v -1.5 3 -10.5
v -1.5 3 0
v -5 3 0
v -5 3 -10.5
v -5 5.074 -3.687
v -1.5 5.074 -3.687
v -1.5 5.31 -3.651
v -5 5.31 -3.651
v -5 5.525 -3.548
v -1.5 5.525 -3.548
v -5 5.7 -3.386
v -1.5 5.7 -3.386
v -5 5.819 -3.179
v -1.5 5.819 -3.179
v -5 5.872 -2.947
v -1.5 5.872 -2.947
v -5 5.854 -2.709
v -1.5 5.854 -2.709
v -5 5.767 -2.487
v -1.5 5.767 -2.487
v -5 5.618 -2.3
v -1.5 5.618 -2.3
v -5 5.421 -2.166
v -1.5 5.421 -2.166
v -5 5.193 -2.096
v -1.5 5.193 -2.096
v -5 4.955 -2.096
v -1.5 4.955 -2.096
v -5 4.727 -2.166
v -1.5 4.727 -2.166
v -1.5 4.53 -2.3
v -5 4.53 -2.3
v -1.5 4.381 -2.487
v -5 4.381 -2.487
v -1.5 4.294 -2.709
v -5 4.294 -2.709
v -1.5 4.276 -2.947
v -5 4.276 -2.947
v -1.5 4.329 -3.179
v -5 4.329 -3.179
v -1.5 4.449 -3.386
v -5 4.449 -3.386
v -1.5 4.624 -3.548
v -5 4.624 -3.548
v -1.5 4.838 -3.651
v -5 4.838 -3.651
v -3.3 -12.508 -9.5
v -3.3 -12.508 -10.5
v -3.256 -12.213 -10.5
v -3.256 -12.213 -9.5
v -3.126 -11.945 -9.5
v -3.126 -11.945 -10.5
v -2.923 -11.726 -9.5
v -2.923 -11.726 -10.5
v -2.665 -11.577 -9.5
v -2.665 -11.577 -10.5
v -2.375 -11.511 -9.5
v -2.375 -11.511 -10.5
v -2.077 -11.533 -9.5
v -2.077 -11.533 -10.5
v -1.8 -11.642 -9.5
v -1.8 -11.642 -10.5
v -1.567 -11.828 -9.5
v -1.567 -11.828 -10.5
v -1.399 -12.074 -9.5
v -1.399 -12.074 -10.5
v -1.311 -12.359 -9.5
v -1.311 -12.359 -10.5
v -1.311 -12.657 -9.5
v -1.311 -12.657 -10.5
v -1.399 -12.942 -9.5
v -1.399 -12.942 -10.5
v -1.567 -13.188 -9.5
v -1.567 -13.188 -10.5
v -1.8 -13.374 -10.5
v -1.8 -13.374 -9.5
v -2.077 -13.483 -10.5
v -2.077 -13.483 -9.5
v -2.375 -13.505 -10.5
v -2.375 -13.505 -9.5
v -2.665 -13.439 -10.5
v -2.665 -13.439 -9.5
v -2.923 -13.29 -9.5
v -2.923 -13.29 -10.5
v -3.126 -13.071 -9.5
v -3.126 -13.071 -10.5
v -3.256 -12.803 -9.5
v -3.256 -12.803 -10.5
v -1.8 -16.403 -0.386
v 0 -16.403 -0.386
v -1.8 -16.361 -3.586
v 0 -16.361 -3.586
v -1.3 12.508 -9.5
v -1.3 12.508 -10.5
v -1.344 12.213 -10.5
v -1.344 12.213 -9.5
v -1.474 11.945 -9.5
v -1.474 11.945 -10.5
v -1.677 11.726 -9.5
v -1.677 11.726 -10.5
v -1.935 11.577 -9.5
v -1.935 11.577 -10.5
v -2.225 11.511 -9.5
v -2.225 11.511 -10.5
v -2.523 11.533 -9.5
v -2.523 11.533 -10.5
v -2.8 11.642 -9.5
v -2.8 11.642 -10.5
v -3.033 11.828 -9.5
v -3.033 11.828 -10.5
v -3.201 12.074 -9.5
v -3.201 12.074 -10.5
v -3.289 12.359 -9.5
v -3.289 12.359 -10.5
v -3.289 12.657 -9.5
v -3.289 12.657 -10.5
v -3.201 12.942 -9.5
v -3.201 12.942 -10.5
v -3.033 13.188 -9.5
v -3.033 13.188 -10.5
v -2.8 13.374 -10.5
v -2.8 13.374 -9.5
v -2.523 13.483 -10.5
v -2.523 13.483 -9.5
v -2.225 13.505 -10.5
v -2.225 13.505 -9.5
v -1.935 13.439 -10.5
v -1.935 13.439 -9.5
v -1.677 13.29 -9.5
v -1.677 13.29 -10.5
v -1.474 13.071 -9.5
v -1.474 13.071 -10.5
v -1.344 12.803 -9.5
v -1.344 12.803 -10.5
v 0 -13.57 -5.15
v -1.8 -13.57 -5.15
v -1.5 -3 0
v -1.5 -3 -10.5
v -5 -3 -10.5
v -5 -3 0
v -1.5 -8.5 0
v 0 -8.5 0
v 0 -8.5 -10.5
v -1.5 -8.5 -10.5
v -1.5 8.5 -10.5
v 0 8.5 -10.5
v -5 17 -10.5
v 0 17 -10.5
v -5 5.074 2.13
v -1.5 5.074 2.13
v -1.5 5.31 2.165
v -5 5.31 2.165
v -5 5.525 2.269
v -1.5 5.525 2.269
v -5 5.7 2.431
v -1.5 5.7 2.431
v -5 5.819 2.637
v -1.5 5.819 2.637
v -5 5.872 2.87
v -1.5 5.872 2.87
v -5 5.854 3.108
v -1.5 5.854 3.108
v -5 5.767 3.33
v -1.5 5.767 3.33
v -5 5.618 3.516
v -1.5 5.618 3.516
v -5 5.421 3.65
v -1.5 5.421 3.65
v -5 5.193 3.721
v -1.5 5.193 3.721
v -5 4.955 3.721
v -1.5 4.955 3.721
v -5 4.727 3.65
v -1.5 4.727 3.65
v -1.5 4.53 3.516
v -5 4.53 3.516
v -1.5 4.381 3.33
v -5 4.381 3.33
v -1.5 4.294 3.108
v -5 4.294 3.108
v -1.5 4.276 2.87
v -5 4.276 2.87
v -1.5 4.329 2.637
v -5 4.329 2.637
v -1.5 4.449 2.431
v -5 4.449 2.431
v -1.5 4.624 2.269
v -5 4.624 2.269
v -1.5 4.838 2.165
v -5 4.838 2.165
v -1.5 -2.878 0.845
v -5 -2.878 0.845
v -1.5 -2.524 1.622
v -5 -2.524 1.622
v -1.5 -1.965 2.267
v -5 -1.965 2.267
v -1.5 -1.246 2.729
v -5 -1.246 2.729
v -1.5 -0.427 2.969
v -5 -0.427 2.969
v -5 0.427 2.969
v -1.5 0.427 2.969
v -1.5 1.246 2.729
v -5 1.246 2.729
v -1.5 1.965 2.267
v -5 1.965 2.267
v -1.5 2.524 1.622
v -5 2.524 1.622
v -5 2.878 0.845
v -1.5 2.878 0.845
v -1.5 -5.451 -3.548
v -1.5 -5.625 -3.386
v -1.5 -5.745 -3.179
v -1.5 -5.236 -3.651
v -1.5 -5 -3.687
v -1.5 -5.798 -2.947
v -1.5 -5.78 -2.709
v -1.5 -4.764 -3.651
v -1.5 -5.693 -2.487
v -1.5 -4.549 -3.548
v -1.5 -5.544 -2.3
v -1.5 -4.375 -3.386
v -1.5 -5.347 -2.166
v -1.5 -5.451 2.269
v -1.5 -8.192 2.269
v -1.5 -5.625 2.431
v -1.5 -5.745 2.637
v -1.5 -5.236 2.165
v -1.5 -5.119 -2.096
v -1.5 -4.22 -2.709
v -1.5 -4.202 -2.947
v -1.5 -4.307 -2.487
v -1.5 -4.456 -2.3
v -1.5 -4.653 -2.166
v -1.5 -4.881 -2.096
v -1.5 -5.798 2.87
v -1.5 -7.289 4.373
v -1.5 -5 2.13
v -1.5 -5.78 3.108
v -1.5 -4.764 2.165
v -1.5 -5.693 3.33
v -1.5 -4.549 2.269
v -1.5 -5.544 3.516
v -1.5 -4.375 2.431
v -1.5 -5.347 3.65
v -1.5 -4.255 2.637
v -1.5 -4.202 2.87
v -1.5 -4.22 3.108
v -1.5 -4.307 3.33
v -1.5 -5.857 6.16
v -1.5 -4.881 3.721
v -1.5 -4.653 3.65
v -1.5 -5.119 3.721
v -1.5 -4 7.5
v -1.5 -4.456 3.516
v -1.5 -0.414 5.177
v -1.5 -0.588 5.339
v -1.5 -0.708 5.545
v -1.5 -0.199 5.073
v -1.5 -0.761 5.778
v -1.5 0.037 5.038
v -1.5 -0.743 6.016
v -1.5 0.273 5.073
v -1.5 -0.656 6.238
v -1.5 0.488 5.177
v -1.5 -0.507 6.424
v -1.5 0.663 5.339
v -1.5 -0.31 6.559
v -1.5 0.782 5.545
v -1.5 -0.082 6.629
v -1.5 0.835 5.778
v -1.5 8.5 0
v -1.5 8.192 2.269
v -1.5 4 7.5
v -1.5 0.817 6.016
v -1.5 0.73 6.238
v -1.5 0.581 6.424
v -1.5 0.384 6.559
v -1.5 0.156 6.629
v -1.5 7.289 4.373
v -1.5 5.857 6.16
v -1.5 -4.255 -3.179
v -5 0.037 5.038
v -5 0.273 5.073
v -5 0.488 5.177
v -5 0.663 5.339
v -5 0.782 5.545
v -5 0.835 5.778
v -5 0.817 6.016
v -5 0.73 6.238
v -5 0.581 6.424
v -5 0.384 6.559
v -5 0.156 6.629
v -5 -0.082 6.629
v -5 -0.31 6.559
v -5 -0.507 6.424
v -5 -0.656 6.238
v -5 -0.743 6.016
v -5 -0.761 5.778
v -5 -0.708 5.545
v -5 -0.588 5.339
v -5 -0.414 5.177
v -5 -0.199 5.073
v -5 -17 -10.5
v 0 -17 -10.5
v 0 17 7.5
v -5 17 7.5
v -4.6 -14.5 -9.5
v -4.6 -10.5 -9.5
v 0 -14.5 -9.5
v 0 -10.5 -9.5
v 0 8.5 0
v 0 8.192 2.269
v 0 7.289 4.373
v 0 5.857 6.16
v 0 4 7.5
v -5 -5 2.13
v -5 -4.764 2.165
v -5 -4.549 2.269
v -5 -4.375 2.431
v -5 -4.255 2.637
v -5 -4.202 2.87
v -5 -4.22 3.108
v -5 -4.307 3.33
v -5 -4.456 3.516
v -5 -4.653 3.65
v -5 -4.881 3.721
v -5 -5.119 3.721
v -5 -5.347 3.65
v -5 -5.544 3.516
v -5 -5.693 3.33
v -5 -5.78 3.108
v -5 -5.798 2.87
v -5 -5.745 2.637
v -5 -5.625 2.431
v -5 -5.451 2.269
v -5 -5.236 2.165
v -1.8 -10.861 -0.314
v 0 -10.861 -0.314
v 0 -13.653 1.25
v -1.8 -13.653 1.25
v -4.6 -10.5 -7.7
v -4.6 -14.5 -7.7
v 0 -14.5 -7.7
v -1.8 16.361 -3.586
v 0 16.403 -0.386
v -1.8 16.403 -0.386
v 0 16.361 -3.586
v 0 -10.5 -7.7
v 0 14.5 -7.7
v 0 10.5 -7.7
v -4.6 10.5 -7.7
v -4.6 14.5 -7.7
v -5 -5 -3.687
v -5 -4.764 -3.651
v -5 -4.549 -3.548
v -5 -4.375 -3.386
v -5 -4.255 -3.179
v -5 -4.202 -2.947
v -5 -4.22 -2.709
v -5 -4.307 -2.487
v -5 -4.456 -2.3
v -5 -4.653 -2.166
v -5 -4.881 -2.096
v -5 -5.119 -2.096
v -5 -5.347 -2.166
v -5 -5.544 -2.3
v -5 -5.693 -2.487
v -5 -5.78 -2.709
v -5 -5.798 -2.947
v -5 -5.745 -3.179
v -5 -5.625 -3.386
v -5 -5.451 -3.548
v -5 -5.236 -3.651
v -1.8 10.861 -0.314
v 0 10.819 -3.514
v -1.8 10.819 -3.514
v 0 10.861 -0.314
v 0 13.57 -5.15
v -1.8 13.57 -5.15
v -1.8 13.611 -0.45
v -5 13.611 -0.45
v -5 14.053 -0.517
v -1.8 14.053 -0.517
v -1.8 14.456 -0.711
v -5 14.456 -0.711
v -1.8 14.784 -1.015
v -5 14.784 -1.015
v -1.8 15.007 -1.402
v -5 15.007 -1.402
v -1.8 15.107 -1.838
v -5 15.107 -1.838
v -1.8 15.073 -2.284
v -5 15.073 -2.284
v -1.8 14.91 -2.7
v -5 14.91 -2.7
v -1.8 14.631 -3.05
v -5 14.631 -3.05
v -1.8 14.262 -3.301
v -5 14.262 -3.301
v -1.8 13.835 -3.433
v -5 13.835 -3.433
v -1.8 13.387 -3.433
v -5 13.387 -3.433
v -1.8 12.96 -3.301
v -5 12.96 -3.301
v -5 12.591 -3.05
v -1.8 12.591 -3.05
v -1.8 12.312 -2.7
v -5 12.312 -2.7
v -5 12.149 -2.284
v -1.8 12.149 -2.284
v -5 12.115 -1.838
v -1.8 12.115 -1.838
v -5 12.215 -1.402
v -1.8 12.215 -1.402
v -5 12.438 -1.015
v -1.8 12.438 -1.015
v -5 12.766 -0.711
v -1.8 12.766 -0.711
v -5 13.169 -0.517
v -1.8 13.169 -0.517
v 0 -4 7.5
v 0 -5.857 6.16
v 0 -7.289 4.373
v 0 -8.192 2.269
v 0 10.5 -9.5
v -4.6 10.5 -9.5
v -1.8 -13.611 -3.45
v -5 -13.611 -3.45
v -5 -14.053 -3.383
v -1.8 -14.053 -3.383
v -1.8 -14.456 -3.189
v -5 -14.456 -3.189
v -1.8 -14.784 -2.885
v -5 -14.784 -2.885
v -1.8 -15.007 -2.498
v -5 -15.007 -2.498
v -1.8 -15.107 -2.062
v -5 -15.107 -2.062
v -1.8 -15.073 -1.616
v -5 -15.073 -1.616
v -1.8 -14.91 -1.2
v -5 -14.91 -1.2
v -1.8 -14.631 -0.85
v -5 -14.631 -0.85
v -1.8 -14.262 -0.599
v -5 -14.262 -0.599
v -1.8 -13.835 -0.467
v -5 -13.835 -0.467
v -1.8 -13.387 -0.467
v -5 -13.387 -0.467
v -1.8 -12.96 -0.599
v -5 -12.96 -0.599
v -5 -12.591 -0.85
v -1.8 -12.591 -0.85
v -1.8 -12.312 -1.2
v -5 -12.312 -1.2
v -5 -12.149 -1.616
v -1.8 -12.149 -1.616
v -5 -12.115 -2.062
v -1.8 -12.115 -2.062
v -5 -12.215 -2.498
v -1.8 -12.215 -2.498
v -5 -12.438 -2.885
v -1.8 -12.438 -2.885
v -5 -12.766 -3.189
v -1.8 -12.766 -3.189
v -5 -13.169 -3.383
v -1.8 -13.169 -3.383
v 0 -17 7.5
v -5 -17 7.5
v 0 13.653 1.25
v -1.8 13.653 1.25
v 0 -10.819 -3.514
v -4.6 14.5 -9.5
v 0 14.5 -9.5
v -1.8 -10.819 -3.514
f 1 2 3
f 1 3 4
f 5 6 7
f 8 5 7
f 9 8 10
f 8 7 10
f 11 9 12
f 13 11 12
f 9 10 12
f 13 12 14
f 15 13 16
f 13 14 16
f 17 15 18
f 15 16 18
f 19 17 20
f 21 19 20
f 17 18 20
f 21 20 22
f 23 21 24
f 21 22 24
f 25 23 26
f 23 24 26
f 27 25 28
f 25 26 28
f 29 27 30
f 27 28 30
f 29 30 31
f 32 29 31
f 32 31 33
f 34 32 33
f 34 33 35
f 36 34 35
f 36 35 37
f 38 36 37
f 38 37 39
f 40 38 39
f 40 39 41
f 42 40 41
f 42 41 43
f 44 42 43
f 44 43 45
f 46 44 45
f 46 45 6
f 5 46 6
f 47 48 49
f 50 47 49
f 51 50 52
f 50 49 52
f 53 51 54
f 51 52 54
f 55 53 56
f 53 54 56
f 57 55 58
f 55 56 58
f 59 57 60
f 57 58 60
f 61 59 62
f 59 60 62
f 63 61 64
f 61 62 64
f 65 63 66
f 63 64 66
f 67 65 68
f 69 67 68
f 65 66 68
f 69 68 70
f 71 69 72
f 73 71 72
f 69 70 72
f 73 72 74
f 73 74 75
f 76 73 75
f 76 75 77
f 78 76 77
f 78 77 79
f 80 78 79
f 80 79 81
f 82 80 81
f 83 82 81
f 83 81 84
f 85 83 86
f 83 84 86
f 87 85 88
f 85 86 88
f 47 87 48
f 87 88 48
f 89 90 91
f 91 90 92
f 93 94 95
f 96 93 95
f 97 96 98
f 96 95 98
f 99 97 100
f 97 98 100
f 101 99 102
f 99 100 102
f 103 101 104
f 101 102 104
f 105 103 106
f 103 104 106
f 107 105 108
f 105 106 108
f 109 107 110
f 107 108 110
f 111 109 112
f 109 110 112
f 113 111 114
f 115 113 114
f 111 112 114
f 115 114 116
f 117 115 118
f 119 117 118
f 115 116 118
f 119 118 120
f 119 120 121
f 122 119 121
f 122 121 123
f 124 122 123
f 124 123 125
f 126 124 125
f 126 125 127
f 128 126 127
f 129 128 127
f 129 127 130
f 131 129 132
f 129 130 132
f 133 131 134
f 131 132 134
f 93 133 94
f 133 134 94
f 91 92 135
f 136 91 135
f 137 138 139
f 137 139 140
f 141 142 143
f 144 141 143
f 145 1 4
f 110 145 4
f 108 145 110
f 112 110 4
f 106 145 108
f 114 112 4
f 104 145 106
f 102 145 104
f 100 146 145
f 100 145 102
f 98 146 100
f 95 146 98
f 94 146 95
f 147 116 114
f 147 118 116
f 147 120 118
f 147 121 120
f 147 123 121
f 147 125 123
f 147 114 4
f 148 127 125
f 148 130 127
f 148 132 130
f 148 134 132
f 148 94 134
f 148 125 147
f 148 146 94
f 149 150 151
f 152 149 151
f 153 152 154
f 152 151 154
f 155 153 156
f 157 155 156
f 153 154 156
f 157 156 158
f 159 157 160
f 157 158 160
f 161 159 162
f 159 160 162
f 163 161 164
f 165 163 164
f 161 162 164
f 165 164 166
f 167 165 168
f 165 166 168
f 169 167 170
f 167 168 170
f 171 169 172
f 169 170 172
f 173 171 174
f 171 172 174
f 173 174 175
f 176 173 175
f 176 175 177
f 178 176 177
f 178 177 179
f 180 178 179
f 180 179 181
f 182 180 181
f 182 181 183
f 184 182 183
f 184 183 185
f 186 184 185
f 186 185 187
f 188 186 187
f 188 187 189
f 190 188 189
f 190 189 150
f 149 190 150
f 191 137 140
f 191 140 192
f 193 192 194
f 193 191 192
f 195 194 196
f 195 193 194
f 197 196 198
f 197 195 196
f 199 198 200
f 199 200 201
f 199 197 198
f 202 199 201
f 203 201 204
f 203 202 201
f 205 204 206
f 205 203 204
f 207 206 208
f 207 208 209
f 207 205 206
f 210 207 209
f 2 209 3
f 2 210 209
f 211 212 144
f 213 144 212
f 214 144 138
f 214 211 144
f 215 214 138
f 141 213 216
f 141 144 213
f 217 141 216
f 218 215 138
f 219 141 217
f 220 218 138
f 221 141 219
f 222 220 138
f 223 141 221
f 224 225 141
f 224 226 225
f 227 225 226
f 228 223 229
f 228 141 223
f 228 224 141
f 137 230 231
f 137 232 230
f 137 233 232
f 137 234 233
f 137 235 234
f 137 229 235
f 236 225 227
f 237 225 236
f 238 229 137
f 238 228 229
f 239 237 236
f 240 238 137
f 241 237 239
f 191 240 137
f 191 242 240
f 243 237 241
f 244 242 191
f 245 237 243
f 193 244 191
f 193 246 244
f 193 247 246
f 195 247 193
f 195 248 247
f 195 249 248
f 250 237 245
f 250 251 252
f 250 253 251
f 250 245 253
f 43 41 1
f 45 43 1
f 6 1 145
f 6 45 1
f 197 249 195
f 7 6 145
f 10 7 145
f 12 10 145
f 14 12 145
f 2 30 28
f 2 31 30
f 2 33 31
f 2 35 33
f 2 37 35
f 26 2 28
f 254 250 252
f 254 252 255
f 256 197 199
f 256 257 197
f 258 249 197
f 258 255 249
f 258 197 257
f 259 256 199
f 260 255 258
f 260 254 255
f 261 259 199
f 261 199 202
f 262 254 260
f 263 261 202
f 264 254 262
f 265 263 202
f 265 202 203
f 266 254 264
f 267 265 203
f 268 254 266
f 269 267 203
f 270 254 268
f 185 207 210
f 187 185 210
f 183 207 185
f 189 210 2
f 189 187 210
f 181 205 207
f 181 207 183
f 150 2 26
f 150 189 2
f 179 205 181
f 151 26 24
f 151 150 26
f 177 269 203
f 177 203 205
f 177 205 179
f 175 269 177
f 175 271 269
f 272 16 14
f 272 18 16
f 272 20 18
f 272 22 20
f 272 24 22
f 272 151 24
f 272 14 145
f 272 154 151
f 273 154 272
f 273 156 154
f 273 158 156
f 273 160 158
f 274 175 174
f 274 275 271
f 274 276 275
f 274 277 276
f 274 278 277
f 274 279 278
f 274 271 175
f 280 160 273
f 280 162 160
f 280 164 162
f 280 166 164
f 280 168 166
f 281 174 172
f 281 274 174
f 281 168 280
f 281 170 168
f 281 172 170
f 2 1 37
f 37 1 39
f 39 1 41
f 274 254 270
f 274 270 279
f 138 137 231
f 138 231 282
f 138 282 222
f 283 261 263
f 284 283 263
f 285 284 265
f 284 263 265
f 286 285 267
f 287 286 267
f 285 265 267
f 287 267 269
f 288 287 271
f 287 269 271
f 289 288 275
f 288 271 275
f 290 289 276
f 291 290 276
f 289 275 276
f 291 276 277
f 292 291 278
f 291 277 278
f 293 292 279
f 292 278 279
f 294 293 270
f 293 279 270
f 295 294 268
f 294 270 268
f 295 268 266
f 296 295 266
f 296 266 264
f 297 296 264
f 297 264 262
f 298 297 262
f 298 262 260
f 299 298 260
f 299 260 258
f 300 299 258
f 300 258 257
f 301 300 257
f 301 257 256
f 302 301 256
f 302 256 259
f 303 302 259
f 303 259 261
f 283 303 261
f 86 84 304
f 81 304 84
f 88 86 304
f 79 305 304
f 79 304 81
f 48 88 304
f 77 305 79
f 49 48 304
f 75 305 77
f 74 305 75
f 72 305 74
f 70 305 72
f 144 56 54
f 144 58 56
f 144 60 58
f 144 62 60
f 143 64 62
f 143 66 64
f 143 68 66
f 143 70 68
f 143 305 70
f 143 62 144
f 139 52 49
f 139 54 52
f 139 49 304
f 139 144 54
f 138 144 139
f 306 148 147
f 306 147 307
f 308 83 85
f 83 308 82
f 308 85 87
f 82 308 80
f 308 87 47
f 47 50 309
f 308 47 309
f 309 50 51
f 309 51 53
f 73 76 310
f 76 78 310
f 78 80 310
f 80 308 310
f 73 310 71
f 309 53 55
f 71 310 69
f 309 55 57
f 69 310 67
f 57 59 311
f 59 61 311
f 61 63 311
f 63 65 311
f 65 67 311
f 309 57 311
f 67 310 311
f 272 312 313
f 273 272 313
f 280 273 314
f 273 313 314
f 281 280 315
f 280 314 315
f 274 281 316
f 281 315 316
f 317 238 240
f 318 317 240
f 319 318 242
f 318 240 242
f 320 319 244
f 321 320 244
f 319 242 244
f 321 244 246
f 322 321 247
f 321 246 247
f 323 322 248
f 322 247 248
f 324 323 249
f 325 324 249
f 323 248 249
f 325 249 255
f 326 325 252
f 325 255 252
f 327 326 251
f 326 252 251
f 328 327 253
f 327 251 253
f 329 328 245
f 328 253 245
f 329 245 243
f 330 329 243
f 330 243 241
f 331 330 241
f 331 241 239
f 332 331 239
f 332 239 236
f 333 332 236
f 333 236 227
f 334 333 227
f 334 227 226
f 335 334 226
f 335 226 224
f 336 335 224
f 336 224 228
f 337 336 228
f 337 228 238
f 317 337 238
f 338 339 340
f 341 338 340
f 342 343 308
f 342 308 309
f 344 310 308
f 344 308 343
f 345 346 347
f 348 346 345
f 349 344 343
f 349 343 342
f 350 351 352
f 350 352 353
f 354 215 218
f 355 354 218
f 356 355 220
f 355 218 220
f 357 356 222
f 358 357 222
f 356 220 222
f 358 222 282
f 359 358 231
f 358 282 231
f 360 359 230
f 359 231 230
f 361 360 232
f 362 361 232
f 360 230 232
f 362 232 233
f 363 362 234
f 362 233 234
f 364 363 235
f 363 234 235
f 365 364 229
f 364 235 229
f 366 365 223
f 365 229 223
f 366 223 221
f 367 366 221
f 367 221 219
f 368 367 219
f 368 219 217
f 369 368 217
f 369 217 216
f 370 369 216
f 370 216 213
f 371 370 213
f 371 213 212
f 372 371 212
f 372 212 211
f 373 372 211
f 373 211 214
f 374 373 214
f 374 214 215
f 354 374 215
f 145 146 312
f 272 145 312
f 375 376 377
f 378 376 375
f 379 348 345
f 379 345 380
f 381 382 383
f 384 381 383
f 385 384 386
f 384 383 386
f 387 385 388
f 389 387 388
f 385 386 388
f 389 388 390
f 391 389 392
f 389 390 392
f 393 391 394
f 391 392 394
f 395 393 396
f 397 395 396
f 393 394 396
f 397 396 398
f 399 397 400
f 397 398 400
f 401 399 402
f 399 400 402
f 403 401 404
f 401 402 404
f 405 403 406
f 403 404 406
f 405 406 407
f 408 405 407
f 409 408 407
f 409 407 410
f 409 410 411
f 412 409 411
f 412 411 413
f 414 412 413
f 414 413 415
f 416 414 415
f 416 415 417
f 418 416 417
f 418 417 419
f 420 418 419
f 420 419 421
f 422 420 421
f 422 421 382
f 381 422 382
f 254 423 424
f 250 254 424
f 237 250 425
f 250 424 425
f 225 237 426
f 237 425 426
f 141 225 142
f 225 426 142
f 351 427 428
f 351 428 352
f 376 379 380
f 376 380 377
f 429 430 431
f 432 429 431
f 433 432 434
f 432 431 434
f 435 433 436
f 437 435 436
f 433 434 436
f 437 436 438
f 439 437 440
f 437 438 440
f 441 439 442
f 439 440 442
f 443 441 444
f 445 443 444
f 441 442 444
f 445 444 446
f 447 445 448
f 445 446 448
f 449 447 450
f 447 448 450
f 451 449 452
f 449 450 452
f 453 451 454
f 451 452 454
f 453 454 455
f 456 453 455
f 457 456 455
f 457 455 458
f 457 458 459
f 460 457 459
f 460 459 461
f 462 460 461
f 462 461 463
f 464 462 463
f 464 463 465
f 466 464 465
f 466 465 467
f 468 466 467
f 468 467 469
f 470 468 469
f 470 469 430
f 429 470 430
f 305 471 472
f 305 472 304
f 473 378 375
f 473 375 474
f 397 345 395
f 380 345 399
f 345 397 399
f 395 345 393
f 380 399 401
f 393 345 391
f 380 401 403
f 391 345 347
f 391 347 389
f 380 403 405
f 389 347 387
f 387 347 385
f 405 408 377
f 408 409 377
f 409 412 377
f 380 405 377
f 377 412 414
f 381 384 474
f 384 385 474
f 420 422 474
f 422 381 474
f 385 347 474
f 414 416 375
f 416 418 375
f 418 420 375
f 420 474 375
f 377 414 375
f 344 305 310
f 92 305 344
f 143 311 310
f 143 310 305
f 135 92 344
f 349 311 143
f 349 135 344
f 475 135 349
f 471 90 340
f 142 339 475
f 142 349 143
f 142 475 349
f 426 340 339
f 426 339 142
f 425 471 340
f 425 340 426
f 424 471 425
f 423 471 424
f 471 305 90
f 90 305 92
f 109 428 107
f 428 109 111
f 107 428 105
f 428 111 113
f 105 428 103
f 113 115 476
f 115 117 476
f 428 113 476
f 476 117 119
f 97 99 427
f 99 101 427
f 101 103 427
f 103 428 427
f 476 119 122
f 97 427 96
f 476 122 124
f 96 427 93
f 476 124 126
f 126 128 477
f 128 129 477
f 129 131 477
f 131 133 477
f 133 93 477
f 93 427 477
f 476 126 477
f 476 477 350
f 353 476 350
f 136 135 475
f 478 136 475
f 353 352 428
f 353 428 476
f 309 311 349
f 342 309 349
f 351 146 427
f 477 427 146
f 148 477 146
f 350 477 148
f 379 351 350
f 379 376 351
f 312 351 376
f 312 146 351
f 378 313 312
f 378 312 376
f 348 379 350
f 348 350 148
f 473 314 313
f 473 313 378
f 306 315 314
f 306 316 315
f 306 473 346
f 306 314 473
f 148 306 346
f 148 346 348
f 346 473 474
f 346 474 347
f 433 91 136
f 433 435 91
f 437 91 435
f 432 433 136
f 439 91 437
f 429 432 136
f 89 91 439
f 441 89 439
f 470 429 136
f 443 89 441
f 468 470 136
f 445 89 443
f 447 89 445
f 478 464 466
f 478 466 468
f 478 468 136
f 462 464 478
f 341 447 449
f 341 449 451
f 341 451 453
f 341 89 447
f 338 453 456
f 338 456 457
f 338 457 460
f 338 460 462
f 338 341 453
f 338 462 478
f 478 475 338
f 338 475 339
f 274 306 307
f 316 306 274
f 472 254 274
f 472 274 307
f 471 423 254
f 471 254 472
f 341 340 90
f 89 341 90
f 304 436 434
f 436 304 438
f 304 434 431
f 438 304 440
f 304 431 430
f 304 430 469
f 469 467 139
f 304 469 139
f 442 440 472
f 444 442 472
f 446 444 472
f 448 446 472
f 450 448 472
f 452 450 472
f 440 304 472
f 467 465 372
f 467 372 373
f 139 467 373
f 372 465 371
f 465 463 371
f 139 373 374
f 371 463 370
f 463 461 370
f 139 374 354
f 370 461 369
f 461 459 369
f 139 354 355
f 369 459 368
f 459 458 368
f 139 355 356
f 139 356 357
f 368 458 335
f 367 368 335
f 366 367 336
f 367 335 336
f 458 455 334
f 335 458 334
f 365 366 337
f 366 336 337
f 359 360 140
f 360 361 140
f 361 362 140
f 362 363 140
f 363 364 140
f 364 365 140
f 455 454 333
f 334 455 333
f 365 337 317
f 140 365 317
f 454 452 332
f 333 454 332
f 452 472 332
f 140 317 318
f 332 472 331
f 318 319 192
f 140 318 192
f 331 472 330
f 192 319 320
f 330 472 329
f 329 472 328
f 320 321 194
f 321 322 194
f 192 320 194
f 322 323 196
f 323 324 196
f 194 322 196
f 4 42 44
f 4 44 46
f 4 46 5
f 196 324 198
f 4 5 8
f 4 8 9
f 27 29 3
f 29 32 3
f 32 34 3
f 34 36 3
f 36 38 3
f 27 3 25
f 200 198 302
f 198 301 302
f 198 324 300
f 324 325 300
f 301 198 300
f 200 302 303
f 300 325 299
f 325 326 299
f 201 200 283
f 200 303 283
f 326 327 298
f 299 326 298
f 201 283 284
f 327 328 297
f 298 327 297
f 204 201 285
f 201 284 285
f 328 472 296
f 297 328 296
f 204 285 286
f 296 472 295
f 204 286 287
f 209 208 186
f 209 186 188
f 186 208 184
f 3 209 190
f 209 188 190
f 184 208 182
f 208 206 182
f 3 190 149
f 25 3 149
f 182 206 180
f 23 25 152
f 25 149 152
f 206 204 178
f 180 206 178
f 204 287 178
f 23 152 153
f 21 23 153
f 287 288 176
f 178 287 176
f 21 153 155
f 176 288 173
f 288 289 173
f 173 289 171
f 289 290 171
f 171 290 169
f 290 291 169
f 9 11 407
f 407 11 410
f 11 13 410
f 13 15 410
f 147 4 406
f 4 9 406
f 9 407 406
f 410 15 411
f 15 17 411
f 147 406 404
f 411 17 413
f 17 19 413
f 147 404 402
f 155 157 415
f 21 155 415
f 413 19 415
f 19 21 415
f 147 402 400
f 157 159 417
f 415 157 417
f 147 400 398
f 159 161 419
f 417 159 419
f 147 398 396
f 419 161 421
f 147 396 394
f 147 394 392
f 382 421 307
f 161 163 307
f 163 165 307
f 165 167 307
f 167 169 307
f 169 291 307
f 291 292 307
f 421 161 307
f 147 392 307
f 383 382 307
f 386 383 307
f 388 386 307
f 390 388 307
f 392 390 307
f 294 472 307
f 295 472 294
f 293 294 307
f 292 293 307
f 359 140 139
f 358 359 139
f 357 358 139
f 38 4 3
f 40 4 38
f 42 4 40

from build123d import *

# Parameters (mm, degrees)
SKETCH_1_R          = 0.8
EXTRUDE_5_DEPTH     = 5
SKETCH_6_R          = 0.8
CUT_EXTRUDE_1_DEPTH = 1.5
SKETCH_7_R          = 1.5
CUT_EXTRUDE_2_DEPTH = 21.597329924
CUT_EXTRUDE_4_DEPTH = 1.8
SKETCH_9_R          = 1
CUT_EXTRUDE_5_DEPTH = 1
SKETCH_10_W         = 4
SKETCH_10_H         = 1.8
CUT_EXTRUDE_6_DEPTH = 4.6


with BuildPart() as part:
    # ｽｹｯﾁ1 → ﾎﾞｽ - 押し出し5 (new body)
    # profile 1 of 3: a face of its own
    with BuildSketch(Plane.YZ):
        with BuildLine():
            Line((-3, -10.5), (-3, -7.95298686))
            ThreePointArc((-3, -7.95298686), (-8.482257997, -0.548907345), (-4, 7.5))
            Line((-4, 7.5), (-17, 7.5))
            Line((-17, 7.5), (-17, -10.5))
            Line((-17, -10.5), (-3, -10.5))
        make_face()
    # profile 2 of 3: a face of its own
    with BuildSketch(Plane.YZ):
        with BuildLine():
            ThreePointArc((-3, 0), (0, 3), (3, 0))
            Line((3, 0), (3, -7.95298686))
            ThreePointArc((3, -7.95298686), (6.991065727, -4.834769901), (8.5, 0))
            ThreePointArc((8.5, 0), (7.288689869, 4.373213921), (4, 7.5))
            Line((4, 7.5), (-4, 7.5))
            ThreePointArc((-4, 7.5), (-8.482257997, -0.548907345), (-3, -7.95298686))
            Line((-3, -7.95298686), (-3, 0))
        make_face()
        with Locations(Location((-5, -2.886751346, 0), (0, 0, 270))):
            Circle(SKETCH_1_R, mode=Mode.SUBTRACT)
        with Locations(Location((5.074182173, -2.886751346, 0), (0, 0, 270))):
            Circle(SKETCH_1_R, mode=Mode.SUBTRACT)
        with Locations(Location((-5, 2.929580443, 0), (0, 0, 270))):
            Circle(SKETCH_1_R, mode=Mode.SUBTRACT)
        with Locations(Location((5.074182173, 2.929580443, 0), (0, 0, 270))):
            Circle(SKETCH_1_R, mode=Mode.SUBTRACT)
        with Locations(Location((0.037091086, 5.837746338, 0), (0, 0, 270))):
            Circle(SKETCH_1_R, mode=Mode.SUBTRACT)
    # profile 3 of 3: a face of its own
    with BuildSketch(Plane.YZ):
        with BuildLine():
            ThreePointArc((8.5, 0), (6.991065727, -4.834769901), (3, -7.95298686))
            Line((3, -7.95298686), (3, -10.5))
            Line((3, -10.5), (17, -10.5))
            Line((17, -10.5), (17, 7.5))
            Line((17, 7.5), (4, 7.5))
            ThreePointArc((4, 7.5), (7.288689869, 4.373213921), (8.5, 0))
        make_face()
    extrude(amount=-EXTRUDE_5_DEPTH)

    # ｽｹｯﾁ6 → ｶｯﾄ - 押し出し1 (cut)
    # profile 1 of 5: a face of its own
    with BuildSketch(Plane.YZ):
        with BuildLine():
            ThreePointArc((-4, 7.5), (-7.288689869, 4.373213921), (-8.5, 0))
            Line((-8.5, 0), (-3, 0))
            ThreePointArc((-3, 0), (0, 3), (3, 0))
            Line((3, 0), (8.5, 0))
            ThreePointArc((8.5, 0), (7.288689869, 4.373213921), (4, 7.5))
            Line((4, 7.5), (-4, 7.5))
        make_face()
        with Locations(Location((-5, 2.929580443, 0), (0, 0, 270))):
            Circle(SKETCH_6_R, mode=Mode.SUBTRACT)
        with Locations(Location((5.074182173, 2.929580443, 0), (0, 0, 270))):
            Circle(SKETCH_6_R, mode=Mode.SUBTRACT)
        with Locations(Location((0.037091086, 5.837746338, 0), (0, 0, 270))):
            Circle(SKETCH_6_R, mode=Mode.SUBTRACT)
    # profile 2 of 5: a face of its own
    with BuildSketch(Plane.YZ):
        with BuildLine():
            Line((-3, 0), (-8.5, 0))
            ThreePointArc((-8.5, 0), (-6.991065727, -4.834769901), (-3, -7.95298686))
            Line((-3, -7.95298686), (-3, 0))
        make_face()
        with Locations(Location((-5, -2.886751346, 0), (0, 0, 270))):
            Circle(SKETCH_6_R, mode=Mode.SUBTRACT)
    # profile 3 of 5: a face of its own
    with BuildSketch(Plane.YZ):
        with BuildLine():
            Line((8.5, 0), (3, 0))
            Line((3, 0), (3, -7.95298686))
            ThreePointArc((3, -7.95298686), (6.991065727, -4.834769901), (8.5, 0))
        make_face()
        with Locations(Location((5.074182173, -2.886751346, 0), (0, 0, 270))):
            Circle(SKETCH_6_R, mode=Mode.SUBTRACT)
    # profile 4 of 5: a face of its own
    with BuildSketch(Plane.YZ):
        with BuildLine():
            ThreePointArc((8.5, 0), (6.991065727, -4.834769901), (3, -7.95298686))
            Line((3, -7.95298686), (3, -10.5))
            Line((3, -10.5), (8.5, -10.5))
            Line((8.5, -10.5), (8.5, 0))
        make_face()
    # profile 5 of 5: a face of its own
    with BuildSketch(Plane.YZ):
        with BuildLine():
            ThreePointArc((-3, -7.95298686), (-6.991065727, -4.834769901), (-8.5, 0))
            Line((-8.5, 0), (-8.5, -10.5))
            Line((-8.5, -10.5), (-3, -10.5))
            Line((-3, -10.5), (-3, -7.95298686))
        make_face()
    extrude(amount=-CUT_EXTRUDE_1_DEPTH, mode=Mode.SUBTRACT)

    # ｽｹｯﾁ7 → ｶｯﾄ - 押し出し2 (cut, through all)
    with BuildSketch(Plane(origin=(-5, 0, 0), x_dir=(0, -1, 0), z_dir=(-1, 0, 0))):
        with Locations(Location((-13.611024943, -1.95, 0), (0, 0, 90))):
            Circle(SKETCH_7_R)
        with Locations(Location((13.611024943, -1.95, 0), (0, 0, 270))):
            Circle(SKETCH_7_R)
    extrude(amount=-CUT_EXTRUDE_2_DEPTH, mode=Mode.SUBTRACT)

    # ｽｹｯﾁ8 → ｶｯﾄ - 押し出し4 (cut)
    with BuildSketch(Plane.YZ):
        Polygon((10.81922748, -3.513926764), (10.860725904, -0.314195857), (13.652523367, 1.249730908), (16.402822406, -0.386073236), (16.361323982, -3.585804143), (13.569526519, -5.149730908), align=None)
        Polygon((-10.860725904, -0.314195857), (-13.652523367, 1.249730908), (-16.402822406, -0.386073236), (-16.361323982, -3.585804143), (-13.569526519, -5.149730908), (-10.81922748, -3.513926764), align=None)
    extrude(amount=-CUT_EXTRUDE_4_DEPTH, mode=Mode.SUBTRACT)

    # ｽｹｯﾁ9 → ｶｯﾄ - 押し出し5 (cut)
    with BuildSketch(Plane(origin=(0, 0, -10.5), x_dir=(1, 0, 0), z_dir=(0, 0, -1))):
        with Locations(Location((-2.3, 12.508141571, 0), (0, 0, 180))):
            Circle(SKETCH_9_R)
        with Locations((-2.3, -12.508141571)):
            Circle(SKETCH_9_R)
    extrude(amount=-CUT_EXTRUDE_5_DEPTH, mode=Mode.SUBTRACT)

    # ｽｹｯﾁ10 → ｶｯﾄ - 押し出し6 (cut)
    with BuildSketch(Plane.YZ):
        with Locations((-12.5, -8.6)):
            Rectangle(SKETCH_10_W, SKETCH_10_H)
        with Locations((12.5, -8.6)):
            Rectangle(SKETCH_10_W, SKETCH_10_H)
    extrude(amount=-CUT_EXTRUDE_6_DEPTH, mode=Mode.SUBTRACT)


solid = part.part
